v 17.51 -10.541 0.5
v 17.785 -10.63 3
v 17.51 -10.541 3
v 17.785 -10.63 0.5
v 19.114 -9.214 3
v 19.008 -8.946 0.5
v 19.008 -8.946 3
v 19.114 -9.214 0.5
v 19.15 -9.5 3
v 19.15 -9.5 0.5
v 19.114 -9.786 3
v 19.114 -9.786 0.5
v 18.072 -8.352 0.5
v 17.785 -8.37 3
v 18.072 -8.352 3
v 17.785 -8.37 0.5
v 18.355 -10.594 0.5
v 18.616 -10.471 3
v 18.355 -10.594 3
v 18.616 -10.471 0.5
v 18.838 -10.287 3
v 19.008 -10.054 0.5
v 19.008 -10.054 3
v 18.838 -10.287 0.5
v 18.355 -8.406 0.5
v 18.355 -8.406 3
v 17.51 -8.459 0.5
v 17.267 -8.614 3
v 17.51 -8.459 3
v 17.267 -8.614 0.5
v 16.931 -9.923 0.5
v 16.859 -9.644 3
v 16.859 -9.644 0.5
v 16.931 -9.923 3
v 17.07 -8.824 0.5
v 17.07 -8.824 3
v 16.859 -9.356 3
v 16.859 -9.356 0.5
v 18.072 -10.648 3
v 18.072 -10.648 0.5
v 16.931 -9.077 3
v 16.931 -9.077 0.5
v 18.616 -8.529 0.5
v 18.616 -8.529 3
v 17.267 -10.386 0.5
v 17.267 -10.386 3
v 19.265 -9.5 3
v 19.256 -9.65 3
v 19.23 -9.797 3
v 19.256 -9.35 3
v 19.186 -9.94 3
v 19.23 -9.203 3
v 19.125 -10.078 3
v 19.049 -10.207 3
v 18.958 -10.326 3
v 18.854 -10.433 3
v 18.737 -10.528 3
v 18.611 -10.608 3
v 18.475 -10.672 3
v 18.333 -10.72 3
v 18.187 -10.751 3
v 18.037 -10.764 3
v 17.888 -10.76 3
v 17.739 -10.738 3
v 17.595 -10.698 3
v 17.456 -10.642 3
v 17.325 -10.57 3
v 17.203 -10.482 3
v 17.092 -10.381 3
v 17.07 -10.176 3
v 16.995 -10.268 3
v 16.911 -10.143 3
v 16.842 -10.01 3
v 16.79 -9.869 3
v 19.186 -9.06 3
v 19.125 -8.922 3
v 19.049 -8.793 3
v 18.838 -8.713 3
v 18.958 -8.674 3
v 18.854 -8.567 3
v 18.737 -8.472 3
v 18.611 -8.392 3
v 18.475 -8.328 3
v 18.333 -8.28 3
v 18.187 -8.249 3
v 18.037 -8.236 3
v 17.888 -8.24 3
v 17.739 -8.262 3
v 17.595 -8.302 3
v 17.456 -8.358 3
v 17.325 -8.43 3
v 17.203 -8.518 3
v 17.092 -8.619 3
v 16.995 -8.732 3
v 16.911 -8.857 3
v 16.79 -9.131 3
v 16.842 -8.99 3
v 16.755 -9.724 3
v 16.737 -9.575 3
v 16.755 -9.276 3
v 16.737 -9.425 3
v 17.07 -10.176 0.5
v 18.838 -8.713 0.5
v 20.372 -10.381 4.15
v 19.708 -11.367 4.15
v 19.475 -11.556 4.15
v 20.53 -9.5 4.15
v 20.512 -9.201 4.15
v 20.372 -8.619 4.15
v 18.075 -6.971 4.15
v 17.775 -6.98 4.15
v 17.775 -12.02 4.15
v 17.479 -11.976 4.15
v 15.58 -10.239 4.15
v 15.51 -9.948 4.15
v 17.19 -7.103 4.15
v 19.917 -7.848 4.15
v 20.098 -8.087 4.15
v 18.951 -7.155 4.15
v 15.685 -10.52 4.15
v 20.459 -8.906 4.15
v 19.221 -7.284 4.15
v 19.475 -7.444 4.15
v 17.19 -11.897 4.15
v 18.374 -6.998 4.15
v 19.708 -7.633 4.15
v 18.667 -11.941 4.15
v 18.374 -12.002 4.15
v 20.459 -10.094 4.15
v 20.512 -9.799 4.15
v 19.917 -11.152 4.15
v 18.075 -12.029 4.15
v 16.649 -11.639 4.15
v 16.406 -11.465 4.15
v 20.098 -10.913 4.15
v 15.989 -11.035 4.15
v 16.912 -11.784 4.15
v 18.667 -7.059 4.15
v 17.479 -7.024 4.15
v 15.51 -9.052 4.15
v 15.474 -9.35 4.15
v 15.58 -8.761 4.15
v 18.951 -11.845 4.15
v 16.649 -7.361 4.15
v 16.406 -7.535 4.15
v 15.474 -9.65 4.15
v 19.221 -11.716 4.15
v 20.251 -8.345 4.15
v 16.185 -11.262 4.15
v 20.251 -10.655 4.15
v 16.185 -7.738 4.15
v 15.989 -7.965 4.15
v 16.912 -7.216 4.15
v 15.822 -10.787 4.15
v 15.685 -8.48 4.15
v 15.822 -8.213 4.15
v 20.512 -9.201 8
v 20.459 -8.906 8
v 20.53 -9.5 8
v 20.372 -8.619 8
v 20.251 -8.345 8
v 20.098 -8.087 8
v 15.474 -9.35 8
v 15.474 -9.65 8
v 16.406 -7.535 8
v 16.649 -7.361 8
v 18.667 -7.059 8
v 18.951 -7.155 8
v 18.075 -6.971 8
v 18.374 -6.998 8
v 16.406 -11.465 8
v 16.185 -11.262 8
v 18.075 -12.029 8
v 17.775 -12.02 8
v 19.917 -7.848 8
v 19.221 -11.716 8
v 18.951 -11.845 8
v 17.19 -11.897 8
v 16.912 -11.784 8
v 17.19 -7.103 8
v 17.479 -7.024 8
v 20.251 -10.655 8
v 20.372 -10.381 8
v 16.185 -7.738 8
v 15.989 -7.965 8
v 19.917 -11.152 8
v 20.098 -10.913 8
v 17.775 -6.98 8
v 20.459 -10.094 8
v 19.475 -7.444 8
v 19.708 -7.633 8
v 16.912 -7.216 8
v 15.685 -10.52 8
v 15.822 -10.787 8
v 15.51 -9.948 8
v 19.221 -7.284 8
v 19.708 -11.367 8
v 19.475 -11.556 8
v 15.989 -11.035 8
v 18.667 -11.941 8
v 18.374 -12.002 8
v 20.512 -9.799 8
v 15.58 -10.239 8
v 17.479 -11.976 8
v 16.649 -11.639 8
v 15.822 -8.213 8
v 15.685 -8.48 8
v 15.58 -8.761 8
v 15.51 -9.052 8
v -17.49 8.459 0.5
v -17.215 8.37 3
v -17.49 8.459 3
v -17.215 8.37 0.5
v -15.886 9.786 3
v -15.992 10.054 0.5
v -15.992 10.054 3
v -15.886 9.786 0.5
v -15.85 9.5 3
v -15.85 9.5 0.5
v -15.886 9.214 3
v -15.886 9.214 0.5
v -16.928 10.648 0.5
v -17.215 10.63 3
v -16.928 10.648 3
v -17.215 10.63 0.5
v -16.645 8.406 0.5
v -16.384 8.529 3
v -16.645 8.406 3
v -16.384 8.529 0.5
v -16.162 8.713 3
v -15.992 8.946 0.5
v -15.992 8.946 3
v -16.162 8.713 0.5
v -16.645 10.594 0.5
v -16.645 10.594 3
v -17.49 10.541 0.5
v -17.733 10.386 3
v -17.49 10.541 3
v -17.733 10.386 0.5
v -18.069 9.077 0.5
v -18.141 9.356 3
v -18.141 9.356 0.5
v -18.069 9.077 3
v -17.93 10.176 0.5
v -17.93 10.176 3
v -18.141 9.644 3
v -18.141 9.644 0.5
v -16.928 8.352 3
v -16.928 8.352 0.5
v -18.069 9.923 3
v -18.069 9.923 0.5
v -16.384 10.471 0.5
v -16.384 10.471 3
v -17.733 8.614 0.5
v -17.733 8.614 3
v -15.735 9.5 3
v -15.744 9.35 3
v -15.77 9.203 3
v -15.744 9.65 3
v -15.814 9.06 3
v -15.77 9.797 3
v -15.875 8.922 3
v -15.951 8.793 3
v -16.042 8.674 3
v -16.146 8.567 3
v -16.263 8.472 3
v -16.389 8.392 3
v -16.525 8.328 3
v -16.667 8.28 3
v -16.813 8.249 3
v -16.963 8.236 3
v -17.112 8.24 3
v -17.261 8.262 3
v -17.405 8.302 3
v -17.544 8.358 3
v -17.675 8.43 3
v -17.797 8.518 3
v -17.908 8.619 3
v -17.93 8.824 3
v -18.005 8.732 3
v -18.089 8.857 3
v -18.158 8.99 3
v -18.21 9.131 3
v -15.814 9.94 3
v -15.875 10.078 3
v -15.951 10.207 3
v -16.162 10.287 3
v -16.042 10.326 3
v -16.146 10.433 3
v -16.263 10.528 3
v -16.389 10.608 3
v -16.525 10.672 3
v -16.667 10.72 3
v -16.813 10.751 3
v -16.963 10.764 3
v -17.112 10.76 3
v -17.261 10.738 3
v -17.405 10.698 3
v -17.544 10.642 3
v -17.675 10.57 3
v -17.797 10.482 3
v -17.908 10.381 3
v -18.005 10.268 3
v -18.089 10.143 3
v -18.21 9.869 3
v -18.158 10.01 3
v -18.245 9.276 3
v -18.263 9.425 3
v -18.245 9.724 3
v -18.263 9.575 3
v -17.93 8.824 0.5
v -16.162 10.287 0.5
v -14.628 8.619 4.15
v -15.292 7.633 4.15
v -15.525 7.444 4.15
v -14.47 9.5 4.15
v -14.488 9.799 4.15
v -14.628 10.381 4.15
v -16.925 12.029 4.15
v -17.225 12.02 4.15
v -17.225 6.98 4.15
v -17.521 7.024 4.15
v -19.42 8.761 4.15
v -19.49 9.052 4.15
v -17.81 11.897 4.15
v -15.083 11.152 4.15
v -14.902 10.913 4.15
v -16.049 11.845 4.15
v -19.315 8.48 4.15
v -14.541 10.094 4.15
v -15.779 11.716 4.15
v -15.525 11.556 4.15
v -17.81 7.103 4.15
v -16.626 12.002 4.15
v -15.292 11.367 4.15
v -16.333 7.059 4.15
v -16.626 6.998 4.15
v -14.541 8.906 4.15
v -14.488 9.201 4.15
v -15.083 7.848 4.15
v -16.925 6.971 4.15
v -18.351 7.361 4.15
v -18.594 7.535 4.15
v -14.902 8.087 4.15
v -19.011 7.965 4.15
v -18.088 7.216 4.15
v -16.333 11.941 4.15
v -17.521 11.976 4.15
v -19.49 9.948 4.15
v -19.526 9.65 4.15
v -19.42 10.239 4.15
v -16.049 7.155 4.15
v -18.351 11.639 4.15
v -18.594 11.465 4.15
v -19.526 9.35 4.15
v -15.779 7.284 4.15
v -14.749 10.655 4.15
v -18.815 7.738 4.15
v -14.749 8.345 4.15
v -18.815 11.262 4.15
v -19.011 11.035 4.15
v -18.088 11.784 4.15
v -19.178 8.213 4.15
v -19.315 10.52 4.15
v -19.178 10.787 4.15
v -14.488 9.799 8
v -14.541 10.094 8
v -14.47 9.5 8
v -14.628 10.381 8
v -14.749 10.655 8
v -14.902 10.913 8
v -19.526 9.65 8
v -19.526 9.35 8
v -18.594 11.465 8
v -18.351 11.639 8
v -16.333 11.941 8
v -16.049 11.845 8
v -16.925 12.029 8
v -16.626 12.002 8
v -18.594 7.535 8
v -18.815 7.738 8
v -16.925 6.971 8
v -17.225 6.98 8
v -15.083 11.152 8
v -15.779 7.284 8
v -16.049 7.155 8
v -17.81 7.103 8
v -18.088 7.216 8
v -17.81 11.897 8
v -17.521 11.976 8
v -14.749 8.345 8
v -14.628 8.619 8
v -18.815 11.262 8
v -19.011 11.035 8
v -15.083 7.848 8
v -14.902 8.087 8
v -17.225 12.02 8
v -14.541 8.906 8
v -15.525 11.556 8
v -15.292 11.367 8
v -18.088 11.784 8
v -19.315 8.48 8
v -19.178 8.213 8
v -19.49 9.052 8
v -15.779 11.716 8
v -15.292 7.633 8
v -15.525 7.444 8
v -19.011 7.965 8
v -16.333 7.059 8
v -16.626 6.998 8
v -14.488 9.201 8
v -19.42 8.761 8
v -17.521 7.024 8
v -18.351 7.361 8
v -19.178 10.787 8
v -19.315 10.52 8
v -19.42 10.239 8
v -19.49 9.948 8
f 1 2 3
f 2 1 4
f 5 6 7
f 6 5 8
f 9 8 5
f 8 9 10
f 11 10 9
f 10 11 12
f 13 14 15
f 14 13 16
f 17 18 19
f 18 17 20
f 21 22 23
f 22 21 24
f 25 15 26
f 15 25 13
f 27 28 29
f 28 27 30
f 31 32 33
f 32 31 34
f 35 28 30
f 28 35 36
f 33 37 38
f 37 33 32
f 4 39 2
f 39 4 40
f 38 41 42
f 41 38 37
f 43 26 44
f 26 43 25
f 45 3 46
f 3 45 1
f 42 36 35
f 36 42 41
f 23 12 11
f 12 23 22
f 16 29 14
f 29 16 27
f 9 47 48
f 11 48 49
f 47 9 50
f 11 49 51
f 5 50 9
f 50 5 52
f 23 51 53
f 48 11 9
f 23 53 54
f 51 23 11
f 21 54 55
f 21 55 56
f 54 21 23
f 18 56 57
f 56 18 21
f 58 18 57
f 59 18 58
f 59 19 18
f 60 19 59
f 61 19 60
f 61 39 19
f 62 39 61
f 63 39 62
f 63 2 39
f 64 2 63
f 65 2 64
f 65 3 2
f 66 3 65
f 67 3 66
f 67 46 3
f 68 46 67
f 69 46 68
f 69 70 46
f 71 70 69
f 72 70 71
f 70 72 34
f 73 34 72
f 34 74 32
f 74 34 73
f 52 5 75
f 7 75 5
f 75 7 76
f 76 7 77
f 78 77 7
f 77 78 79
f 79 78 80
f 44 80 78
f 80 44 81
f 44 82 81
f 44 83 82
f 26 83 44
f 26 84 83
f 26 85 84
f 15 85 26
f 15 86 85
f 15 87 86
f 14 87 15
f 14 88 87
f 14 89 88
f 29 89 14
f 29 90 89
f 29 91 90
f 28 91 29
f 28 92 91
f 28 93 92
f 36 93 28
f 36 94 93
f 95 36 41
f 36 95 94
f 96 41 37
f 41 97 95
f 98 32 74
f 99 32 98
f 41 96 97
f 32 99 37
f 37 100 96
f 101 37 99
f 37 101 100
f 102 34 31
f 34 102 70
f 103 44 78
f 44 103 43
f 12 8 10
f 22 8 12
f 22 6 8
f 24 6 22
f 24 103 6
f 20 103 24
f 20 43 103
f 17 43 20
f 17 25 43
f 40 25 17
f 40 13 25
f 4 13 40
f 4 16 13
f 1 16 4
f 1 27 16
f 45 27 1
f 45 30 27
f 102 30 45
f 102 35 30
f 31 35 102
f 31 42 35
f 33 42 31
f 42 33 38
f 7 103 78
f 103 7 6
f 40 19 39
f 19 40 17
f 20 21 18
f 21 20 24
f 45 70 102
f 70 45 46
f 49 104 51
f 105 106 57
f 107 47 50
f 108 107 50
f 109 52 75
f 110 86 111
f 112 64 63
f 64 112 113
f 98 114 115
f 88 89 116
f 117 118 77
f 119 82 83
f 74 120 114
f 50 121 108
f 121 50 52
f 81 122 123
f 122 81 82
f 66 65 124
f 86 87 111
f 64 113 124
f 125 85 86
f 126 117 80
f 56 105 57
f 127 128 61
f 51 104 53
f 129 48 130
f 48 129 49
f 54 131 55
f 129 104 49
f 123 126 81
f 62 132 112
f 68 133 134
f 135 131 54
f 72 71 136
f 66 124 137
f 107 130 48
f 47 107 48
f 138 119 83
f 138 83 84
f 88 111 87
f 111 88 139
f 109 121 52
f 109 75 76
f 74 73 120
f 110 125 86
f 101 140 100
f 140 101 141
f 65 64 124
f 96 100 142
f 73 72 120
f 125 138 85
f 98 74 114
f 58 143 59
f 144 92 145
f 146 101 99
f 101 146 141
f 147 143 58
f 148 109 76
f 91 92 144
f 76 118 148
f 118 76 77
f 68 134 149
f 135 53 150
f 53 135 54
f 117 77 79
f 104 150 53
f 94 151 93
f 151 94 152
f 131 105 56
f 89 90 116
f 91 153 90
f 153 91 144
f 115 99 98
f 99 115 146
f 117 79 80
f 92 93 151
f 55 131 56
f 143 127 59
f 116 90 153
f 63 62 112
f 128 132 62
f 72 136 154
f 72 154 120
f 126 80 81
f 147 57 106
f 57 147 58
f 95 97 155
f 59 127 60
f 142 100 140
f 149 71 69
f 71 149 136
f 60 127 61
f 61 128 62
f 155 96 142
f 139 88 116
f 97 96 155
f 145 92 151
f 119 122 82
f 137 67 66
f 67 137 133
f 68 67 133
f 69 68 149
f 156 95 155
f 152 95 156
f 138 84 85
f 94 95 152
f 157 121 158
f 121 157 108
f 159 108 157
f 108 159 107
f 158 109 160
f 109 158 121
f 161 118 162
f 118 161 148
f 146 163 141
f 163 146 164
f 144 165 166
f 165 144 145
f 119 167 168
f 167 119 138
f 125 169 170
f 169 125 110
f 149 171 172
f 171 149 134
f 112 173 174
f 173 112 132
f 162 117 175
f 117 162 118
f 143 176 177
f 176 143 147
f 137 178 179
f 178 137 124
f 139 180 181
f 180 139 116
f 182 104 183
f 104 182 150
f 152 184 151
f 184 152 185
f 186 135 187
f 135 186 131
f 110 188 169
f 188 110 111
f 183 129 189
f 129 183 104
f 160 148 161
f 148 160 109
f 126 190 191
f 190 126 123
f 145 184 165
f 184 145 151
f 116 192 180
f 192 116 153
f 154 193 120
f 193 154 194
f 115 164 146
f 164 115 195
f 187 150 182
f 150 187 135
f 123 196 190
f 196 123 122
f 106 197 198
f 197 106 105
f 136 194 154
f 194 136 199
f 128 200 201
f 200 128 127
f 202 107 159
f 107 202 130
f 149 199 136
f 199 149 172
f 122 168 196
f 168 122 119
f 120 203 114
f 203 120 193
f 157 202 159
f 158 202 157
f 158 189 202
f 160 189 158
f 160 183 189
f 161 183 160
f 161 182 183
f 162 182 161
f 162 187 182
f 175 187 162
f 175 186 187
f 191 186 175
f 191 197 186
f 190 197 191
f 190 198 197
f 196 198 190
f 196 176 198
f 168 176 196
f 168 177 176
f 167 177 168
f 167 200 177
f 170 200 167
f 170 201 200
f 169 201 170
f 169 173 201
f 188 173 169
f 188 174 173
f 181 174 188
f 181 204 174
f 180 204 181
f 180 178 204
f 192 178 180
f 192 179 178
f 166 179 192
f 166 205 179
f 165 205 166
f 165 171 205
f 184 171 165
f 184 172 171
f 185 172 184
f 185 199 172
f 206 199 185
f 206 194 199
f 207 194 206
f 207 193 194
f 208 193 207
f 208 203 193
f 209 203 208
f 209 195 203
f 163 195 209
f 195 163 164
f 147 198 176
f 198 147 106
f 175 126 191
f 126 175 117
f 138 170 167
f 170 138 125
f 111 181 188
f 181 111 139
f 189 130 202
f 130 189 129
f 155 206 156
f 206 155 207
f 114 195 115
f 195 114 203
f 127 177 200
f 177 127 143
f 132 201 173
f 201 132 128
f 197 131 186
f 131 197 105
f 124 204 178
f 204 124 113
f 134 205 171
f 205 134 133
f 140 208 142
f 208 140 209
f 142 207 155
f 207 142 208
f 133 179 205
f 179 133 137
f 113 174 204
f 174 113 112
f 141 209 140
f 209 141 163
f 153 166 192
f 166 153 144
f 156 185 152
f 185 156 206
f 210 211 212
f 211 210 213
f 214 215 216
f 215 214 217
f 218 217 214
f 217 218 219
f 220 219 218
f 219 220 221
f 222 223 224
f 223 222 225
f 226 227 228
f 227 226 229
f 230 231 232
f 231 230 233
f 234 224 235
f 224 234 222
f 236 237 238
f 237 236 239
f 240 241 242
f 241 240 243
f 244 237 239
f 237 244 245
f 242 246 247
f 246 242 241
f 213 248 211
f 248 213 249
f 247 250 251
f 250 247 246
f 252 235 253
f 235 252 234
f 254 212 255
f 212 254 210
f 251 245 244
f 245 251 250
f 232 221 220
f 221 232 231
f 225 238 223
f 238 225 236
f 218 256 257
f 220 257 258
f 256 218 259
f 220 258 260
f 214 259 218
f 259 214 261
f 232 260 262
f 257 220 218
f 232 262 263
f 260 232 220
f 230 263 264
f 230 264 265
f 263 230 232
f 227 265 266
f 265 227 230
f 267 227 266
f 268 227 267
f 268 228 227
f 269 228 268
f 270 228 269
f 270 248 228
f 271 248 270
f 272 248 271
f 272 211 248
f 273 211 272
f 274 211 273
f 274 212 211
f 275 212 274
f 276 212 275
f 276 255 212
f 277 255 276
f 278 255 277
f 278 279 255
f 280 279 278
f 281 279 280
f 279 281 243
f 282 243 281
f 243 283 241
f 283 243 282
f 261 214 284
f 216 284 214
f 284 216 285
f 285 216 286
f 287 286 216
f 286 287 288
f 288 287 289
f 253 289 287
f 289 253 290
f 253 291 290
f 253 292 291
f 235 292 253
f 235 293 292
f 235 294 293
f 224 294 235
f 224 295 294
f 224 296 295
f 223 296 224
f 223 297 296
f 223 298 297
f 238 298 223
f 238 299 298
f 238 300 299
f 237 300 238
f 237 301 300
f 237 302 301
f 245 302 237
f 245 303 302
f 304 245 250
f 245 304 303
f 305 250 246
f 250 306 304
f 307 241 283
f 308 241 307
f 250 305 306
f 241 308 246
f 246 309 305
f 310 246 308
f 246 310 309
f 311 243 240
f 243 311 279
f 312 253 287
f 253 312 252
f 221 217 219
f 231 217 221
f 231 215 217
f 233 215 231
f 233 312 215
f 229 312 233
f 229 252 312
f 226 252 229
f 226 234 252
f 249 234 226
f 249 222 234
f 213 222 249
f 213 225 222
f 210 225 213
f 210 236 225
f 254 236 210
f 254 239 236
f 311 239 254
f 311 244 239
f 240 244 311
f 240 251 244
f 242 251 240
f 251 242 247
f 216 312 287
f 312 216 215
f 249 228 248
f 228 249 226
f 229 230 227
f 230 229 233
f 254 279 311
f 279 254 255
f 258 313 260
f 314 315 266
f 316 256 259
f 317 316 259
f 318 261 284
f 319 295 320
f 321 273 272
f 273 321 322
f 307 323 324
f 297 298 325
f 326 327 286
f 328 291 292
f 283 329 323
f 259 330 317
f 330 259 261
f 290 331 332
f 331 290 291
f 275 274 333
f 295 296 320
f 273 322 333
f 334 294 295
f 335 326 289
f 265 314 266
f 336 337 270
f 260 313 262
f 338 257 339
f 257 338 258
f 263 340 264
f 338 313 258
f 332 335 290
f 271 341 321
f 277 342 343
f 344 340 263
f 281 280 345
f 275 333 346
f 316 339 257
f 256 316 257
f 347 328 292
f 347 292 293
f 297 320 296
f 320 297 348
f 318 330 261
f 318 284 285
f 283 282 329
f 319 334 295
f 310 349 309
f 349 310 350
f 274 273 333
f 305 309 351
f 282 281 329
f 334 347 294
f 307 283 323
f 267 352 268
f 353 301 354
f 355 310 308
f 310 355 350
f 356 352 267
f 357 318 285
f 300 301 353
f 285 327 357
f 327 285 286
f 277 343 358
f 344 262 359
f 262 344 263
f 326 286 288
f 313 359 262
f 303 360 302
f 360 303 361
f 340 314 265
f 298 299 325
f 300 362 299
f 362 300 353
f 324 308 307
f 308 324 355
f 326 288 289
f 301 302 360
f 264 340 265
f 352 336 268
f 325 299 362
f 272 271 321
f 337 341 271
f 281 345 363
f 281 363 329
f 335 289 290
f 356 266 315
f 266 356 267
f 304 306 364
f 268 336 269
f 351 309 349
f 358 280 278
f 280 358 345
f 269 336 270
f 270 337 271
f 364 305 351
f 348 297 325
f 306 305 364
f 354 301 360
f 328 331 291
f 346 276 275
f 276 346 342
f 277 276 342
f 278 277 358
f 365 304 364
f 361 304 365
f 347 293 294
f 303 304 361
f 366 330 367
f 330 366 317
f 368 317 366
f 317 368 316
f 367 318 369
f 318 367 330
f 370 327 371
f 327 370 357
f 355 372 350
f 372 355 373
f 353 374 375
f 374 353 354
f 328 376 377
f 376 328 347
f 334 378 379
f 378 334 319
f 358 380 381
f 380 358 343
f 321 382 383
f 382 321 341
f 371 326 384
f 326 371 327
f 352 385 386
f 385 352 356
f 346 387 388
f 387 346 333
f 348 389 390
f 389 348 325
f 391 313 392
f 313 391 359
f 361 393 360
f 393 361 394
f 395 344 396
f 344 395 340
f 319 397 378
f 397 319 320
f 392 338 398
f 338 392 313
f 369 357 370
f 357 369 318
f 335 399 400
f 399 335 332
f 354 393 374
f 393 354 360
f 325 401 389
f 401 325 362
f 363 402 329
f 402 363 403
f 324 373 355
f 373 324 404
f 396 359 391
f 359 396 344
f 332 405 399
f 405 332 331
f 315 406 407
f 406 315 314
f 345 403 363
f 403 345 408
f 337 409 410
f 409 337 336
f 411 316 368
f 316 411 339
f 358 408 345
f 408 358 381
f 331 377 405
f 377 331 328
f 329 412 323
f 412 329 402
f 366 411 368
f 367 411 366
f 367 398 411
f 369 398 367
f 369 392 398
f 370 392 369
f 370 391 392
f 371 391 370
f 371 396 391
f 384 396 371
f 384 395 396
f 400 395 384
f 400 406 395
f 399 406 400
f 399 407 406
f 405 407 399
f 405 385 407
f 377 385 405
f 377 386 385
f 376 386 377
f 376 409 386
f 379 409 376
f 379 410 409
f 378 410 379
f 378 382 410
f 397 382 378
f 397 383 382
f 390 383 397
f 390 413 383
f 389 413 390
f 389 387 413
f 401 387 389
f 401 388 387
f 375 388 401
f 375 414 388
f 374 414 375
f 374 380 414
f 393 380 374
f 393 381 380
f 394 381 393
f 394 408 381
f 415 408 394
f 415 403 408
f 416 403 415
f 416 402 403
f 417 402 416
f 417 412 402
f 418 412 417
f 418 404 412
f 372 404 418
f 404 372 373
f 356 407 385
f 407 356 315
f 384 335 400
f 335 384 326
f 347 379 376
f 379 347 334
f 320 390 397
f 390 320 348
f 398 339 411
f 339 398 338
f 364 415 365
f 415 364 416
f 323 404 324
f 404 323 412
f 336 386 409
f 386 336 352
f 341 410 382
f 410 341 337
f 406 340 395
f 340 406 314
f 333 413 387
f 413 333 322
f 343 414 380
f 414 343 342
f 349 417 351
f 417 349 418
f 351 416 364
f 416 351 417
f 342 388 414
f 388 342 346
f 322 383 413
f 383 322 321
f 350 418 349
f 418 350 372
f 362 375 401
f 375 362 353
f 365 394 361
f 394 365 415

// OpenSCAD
// file: usedims.scad
acc =  "print";  // "show"

$fa = acc=="print" ? 2 : 7; //1;
$fs = acc=="print" ? .3 : 1; //.2; //.02


mountT=22;
rcorner=2;

//BODY:
Rtop=11; //mountT;
Hframe=193;
Wbottom=100; //95; //  124;
alpha = 4.5; //4.5; // 7.5
Wtop = edgex(Hframe)*2; // Wbottom - 2*Hframe*tan(alpha); //Whead-2; // + 2*Rtop*tan(alpha);
//alpha = atan(((Wbottom-Wtop)/2)/(Hframe + Rtop));
Rbottom = rcorner;
Tframe=55;
Hthick = 30;

//HEAD:
//Whead=59; 
Hhead=115;
Lhead=42;
Hneck = .4;
Rhead=rcorner;
headaddW=0;
Zheadbottom=Hframe+Rtop+Hneck+Rhead; 
Wheadbottom=edgex(Zheadbottom)*2 + headaddW; 
Wheadtop=edgex(Zheadbottom+Hhead)*2 + headaddW; 
wallT=1.60;
headtheta=6.9;
headBottomT = Lhead - mountT;
headServoNteeth=15;
mountD=6;
dwall = 4;
headmountpolepos1=[for (z=[dwall]) [edgex(z, Wheadbottom) - dwall,z]];
sf = 6;
headmountpolepos2= concat(headmountpolepos1, [for (p=headmountpolepos1) [-p[0], p[1]]]); // [[Whead/2 - dwall, Hhead/2 - sf], [-Whead/2 + dwall, Hhead/2 + sf]]);
headmountpolepos= concat(headmountpolepos2, [for (z=[[-1, Hhead/2-4], [1, Hhead/2-4]]) [z[0]*edgex(z[1], Wheadbottom)-z[0]*dwall, z[1]]]); // [[Whead/2 - dwall, Hhead/2 - sf], [-Whead/2 + dwall, Hhead/2 + sf]]);



//
function edgex(h, W=Wbottom) = W/2 - h*tan(alpha);

framemountpolepos_l=[for (h=[-Rbottom+dwall,Hframe/2-12, Hframe-40, Hframe]) [edgex(h) - dwall, h]];
framemountpolepos_r=[for (p=framemountpolepos_l) [-p[0], p[1]]];
framemountpolepos_b=[for (i=[-1,1]) [i*18, -Rbottom + dwall]];
framemountpolepos = concat(framemountpolepos_l, framemountpolepos_r, framemountpolepos_b);

echo(framemountpolepos);

TIGHTSP = .05;
MEDIUMSP = .1;
//
// BOLTS:
BOLT5TIGHT=4.8;
BOLT5LOOSE=5.05;
BOLT3TIGHT=2.8;
BOLT3LOOSE=3.05;
BOLT25TIGHT = 2.30; // 2.35
BOLT25LOOSE = 2.60;
BOLT15TIGHT = 1.30; // 2.35
BOLT15LOOSE = 1.60;

AXLEBEARINGDIMS = [10, 15, 4];
AXLECOVERT = 1.2;
SERVOHORNSP = .96;
// file: utils.scad
include <dims.scad>;
include <usedims.scad>;

function pitchD(ntooth, modul=GEARMODUL) = ntooth*modul;
function getNTeeth(servoNtooth, targetTurnAngle, servoTrunAngle) = ceil(servoNtooth/targetTurnAngle*servoTrunAngle);
function gearD(ntooth, modul=GEARMODUL) = ntooth*modul + 2*modul;
module bolt(h, d, sink, baseL=5, key="csunk"){
   	
	// Expand the bolt sink hole by this amount: 
	sinkExpFac = 1.1;
	
	// Gray bolts
    	color("Gray")
    	translate([0,0,sink])
    	union(){
		// bolt thread
		translate([0,0,d/2]) cylinder(h=h, r=d/2);
		// bolt base
		if (key=="csunk"){cylinder(h=d/2, r1=d*sinkExpFac, r2=d/2*sinkExpFac);}
		else if (key=="flat"){cylinder(h=d/2 - .2, r=d*sinkExpFac);}
		
		translate([0,0,-baseL - sink]) cylinder(h=baseL + sink, r=d*sinkExpFac);
    	}
}


module thread(h, d, phi=0, threadH=THREADH, pitch=THREADPITCH, aligner="show", dtip1=0, dtip2=0, handness="right"){

	handmltp = handness == "right" ? -1 : 1;
	phi = -phi*handmltp;
	twistphi = handmltp*h/pitch*360;
	dtip1 = dtip1==0 ? d*4/5 : dtip1; // top
	dtip2 = dtip2==0 ? d*4/5 : dtip2; // bottom

	module thread_base(){
		difference(){
		rotate([0,0,twistphi/2])
		linear_extrude(height=h, twist=twistphi, center=true, slices=round(h/.15)) 
		translate([threadH/2,0]) 
		circle(d/2-threadH/2);
		if (htip(dtip1)>0){translate([0,0,h/2]) tipcutter(dtip1);}
		if (htip(dtip2)>0){translate([0,0,-h/2]) mirror([0,0,1]) tipcutter(dtip2);}
		}

	}
	
	tiptheta = 60;
	function htip(dtip) = (d - dtip)/2*tan(tiptheta);

	module tipcutter(dtip){
		htip_ = htip(dtip);
		translate([0,0,-htip_])
		difference(){
			cylinder(h=2*htip_, d=2*d);
			cylinder(h=htip_, d1=d, d2=dtip);
		}
	}
	
	rotate([0,0,phi]){
		if (aligner=="dontshow"){
			thread_base();
		}
		else if (aligner=="show"){	
			thread_base();
			translate([50,0,0])cube([100, 1, 1], center=true);
		}
		else if (aligner=="onlyaligner"){
			translate([50,0,0])cube([100, 1, 1], center=true);
		}
	
	}

}
module closebolts(key, positions, L, forceboltD=-1){
 
 boltD_ = key=="boltsup" ? BOLT3LOOSE :
         key == "boltsbot" ? BOLT3TIGHT : 0;
 
 boltD = forceboltD > 0 ? forceboltD : boltD_;

 key_ = key=="boltsup" || key=="boltsbot" ? "bolt" : key;
 for (pos=positions){
   x = pos[0];
   z = pos[1];
   translate([x,0,z]) 
   rotate([90,0,0])
   closebar(L=L, boltD=boltD, key=key_);
 }
}

module closebar(L, boltD=BOLT3LOOSE, key="mockup"){
  Ltop = L/2;
  Lbot = L/2 - .5;
  D = CLOSEBARD; 
  if (key=="barup"){
    cylinder(d=D, h = Ltop);
  }
  else if (key=="barbot"){
    translate([0,0,-L/2])
    cylinder(d=D, h = Lbot);
  }
  else if (key=="bolt"){
    mirror([0,0,1])
    translate([0,0,-L/2])
    bolt(L-3, d=boltD,sink=.5);
    mirror([0,0,1]) cylinder(h=.5, r=boltD);
  }
  
  //bolt(L-3, d=boltD,sink=.5);
}

module rounded_tilted_cylinder(L, R, r, alpha){
  
  assert(R>=r); 
  module end(){
    translate([0,0,L/2])
    rotate([0,alpha, 0])  
    translate([0,0,-r*cos(alpha)])
    scale([1/cos(alpha), 1, 1])
  
    rotate_extrude()
    union(){
      translate([0,-r]) square([R-r, 2*r]);  
      translate([R-r, 0]) 
      intersection(){
        circle(r);
        translate([0,-r]) square([r, 2*r]);
      }
      }

    }

    hull(){
    end();
    mirror([0,0,1]) end();
    }
}

module selector(ycut, side=-1){

  shifty = side==-1 ? 5000 : -5000; 
  
  difference(){
    children();
    translate([0,shifty + ycut, 0]) cube(10000, center=true);
  }
  
  
}

module mount_poles_bolts(positions, D=mountD, negy=-500, holeD=0){
  
  for (p=positions){
    translate([p[0], negy, p[1]])
    rotate([-90,0,0]) 
    if (holeD>0){
      difference(){
        bolt(1000, d=D, sink=.2);
        cylinder(h=2000, d=holeD);
      }
    }
    else {bolt(1000, d=D, sink=.2);}
  }
}



module roundedcube(size = [1, 1, 1], center = false, radius = 0.5, apply_to = "all") {
	// If single value, convert to [x, y, z] vector
	size = (size[0] == undef) ? [size, size, size] : size;

	translate_min = radius;
	translate_xmax = size[0] - radius;
	translate_ymax = size[1] - radius;
	translate_zmax = size[2] - radius;

	diameter = radius * 2;

	module build_point(type = "sphere", rotate = [0, 0, 0]) {
		if (type == "sphere") {
			sphere(r = radius);
		} else if (type == "cylinder") {
			rotate(a = rotate)
			cylinder(h = diameter, r = radius, center = true);
		}
	}

	obj_translate = (center == false) ?
		[0, 0, 0] : [
			-(size[0] / 2),
			-(size[1] / 2),
			-(size[2] / 2)
		];

	translate(v = obj_translate) {
		hull() {
			for (translate_x = [translate_min, translate_xmax]) {
				x_at = (translate_x == translate_min) ? "min" : "max";
				for (translate_y = [translate_min, translate_ymax]) {
					y_at = (translate_y == translate_min) ? "min" : "max";
					for (translate_z = [translate_min, translate_zmax]) {
						z_at = (translate_z == translate_min) ? "min" : "max";

						translate(v = [translate_x, translate_y, translate_z])
						if (
							(apply_to == "all") ||
							(apply_to == "xmin" && x_at == "min") || (apply_to == "xmax" && x_at == "max") ||
							(apply_to == "ymin" && y_at == "min") || (apply_to == "ymax" && y_at == "max") ||
							(apply_to == "zmin" && z_at == "min") || (apply_to == "zmax" && z_at == "max")
						) {
							build_point("sphere");
						} else {
							rotate = 
								(apply_to == "xmin" || apply_to == "xmax" || apply_to == "x") ? [0, 90, 0] : (
								(apply_to == "ymin" || apply_to == "ymax" || apply_to == "y") ? [90, 90, 0] :
								[0, 0, 0]
							);
							build_point("cylinder", rotate);
						}
					}
				}
			}
		}
	}
}


function slice(a, i1=0, i2=-1) =i2==-1 ? slice(a, i1, len(a)) : [for (i = [ 0 :1:len(a)-1]) if (i>=i1 && i<(i2+1)) a[i]];


function sum_slice(a, i1=0, i2=-1) = sum(slice(a, i1, i2));

function sum(a, i=0, r=0) = i < len(a) ? sum(a, i+1, r+a[i]) : r;

function cumsum(a) = [for (i=[0:1:len(a)-1]) sum_slice(a, 0, i)];


module rounded_cutter(L, W, T, r){
  assert(min(W,T)>2*r);

  linear_extrude(height=L, center=true)
  offset(r)
  square([W-2*r, T-2*r],center=true);

}
// file: dims.scad
Llow = 96;
Lup_low = 119;
Lup_top = 65;
Wbot=80; //72;
servoaxleL = Wbot/5*2;
hornW = .85*servoaxleL;
Dbot=30;
Lservo = 57;
wallT = 2;
rbot=wallT/2;
rcablebundle=6;
xcablebundle = Wbot/2 - rcablebundle - rbot - 5.5;
xconnection=-3; //-6.1;
mouthR = 11/2+wallT; //Dbot/4;
dedge = Wbot/2 - rbot - 3.5; //BOLT3LOOSE;

BEAMMAXANGLE=120;
mouthcablex = 13;
CLOSEBARD=3+.42*8;
CHINDIST=.2;
SERVOTURNANGLE = 120;

beamServoNtooth= 20;
mg215dims = [23, 26.5, 12, 6];	
LHORNTHREAD = 12;
hornarmL=Dbot/2 - 5.3;
xleg=10;

Wlegs = Wbot + 2;
Tlegs = Dbot/3*2;
Hlegs = 18;

// BOLTS:
BOLT5TIGHT=4.8;
BOLT5LOOSE=5.05;
BOLT3TIGHT=2.8;
BOLT3LOOSE=3.05;
BOLT25TIGHT = 2.30; // 2.35
BOLT25LOOSE = 2.60;
BOLT15TIGHT = 1.30; // 2.35
BOLT15LOOSE = 1.60;

// GEARS:
//GEART = 12; //6
GEARMODUL = 1.0; //1.0;
HELIXANGLE=20; // 30
PRESSUREANGLE=10; //25;

SERVOGEARNTOOTH = 15; // 15
SERVOHORNT = 7.0; //6
SERVOHORNBEARINGT = 4;

// Bore, Diam, Thickness
SERVOBEARINGDIMS = [5, 11, 4];
AXLEBEARINGDIMS = [10, 15, 4];
WHEELBEARINGDIMS = [20, 27, 4];

AXLEHORNDIN = AXLEBEARINGDIMS[0]/sqrt(2);

SERVOHORNSP = .96;
TIGHTSP = .05;
RADSP = .15; // .25
AXLECOVERT = 1.2;

THREADH=.6;
THREADPITCH = 2;



GEARCOLOR="Ivory"; //WhiteSmoke"; //SlateGray";
BEARINGCOLOR="Gray";
$fn = 0; //50000;


THREADSPACEPHI = 30; // Positive means you have to twist further to tighten by phi than theory.
SHOWALIGNERS = false; //true; 
CUTALIGNERS = false; // Cut wedges to gears to check match.
// main file
include <dims.scad>;
use <utils.scad>;

servoctrldims = [30,20,10];
servoctrlmntpos = [[0,1], [20, 10]];

module generalel(dims, mountpos, boltD=BOLT3TIGHT, H=2, key="mockup", boltH=0, poleD=0){
	
	poleD = poleD==0 ? boltD*2 : poleD;
	module poles(){
		for (p=mountpos){
			translate(p) cylinder(h=H, d=poleD);
		}
	}

	module bolts(){
		boltH = boltH == 0 ? H - .5 : boltH;
		
		color("Gray")	
		for (p=mountpos){
			translate(p) translate([0,0,H]) mirror([0,0, 1]) bolt(boltH, boltD, -boltD/2);
		}
	}
	
	translate([-dims[0]/2, -dims[1]/2, 0])
	if (key=="mockup"){
		echo("mckup");
		poles();
		color("Navy")
		translate([0,0,H]) cube(dims);
	}
	else if (key=="bolts"){bolts();}
	else if (key=="poles"){poles();}
	else if (key=="board"){
    		color("Navy")
		translate([0,0,H]) cube(dims);
	}
}


module micarray(H=5, key="mockup", boltH=0){
	
	dims = [65, 65, 2];
	mountpos = [[3.5, 8], [61.5, 8], [3.5, 57], [61.5, 57]];
	boltD = BOLT25TIGHT;
	boltH= boltH==0 ? H + 1: boltH; //  + 1.5;
	H = H;

	generalel(dims, mountpos, boltD=boltD, H=H, key=key, boltH=boltH);
	
	module ledring(){
		ringh = boltH;
		translate([0,0,H-ringh])
		difference(){
			cylinder(h=ringh, r=62/2);
			cylinder(h=ringh, r=62/2-5);
		}
	}
	
	module micring(){
		mich = H + 15;
		
		for (phi=[90:90:360]){
			rotate([0,0,phi])
			translate([dims[0]/2 - 2 - 1., dims[1]/2 - 3, -mich/2 + H]) 
			cube([4+1, 3+1, mich], center=true);
		}
	}
	
	if (key=="micsleds"){
		ledring();
		micring();
	}
	
}
module huzzah32(H=5, key="mockup", boltH=0, boltD=BOLT25TIGHT){
	dims = [2*25.4, 0.9*25.4, 2];
        mounty = 0.15*25.4/2;
	mountpos = [[2.5, mounty], [dims[0] - 2.5, mounty], [2.5, dims[1] - 2.5], [dims[0] - 2.5, dims[1] - mounty]];
	//boltH= boltH==0 ? H : boltH; //  + 1.5;
	color("DarkSlateGray")	
	if (key!="usb") generalel(dims, mountpos, boltD=boltD, H=H, key=key, boltH=boltH);
	else {
		usbr = 4;
		w = 11;

		hull() for (y=[-1,1]) translate([-dims[0]/2, (w/2-usbr)*y, H + 2.5]) rotate([00,90,0]) cylinder(h=15, r=usbr, center=true);
	}
	

}
module imu(H=5, key="mockup", boltH=0, boltD=BOLT25TIGHT){
	dims = [25.4, 0.9*25.4, 2];
	mountpos = [[2.54, 2.54], [dims[0] - 2.54, 2.54], [2.5, dims[1] - 2.54], [dims[0] - 2.54, dims[1] - 2.54]];

	color("DarkSlateGray")	
	if (key!="usb") generalel(dims, mountpos, boltD=boltD, H=H, key=key, boltH=boltH);
	else {
		usbr = 4;
		w = 11;

		hull() for (y=[-1,1]) translate([-dims[0]/2, (w/2-usbr)*y, H + 2]) rotate([00,90,0]) cylinder(h=15, r=usbr, center=true);
	}
	

}

module buckconverter(H=5, key="mockup", boltH=0, boltD=BOLT25TIGHT){
	dims = [43, 21, 2];
	mountpos = [[36.5, 2.5], [6.5, 21-2.5]];
	
	//boltH = boltH==0 ? H: boltH; //  + 1.5;
	
	color("DarkSlateGray")	
	generalel(dims, mountpos, boltD=boltD, H=H, key=key, boltH=boltH);

}
module buckconverter_XL4015(H=5, key="mockup", boltH=0, boltD=BOLT25TIGHT){
	dims = [54, 24, 2];
	mountpos = [[45, 2.5], [10, 24-2.5]];
	
	//boltH = boltH==0 ? H: boltH; //  + 1.5;
	
	color("DarkSlateGray")	
	generalel(dims, mountpos, boltD=boltD, H=H, key=key, boltH=boltH);
	//translate([54/2,0,H]) cube(2, center=true);
}

module servoctrl(H=5, key="mockup", boltH=0, boltD=BOLT25TIGHT){
	dims = [63, 25.5, 2];
	mountpos = [[3.5, 3], [59.5, 3], [3.5, 22], [59.5, 22]];
	//boltH= boltH==0 ? H : boltH; //  + 1.5;
	color("DarkSlateGray")	
	generalel(dims, mountpos, boltD=boltD, H=H, key=key, boltH=boltH);

}

module nanoble(H=5, key="mockup", boltH=0, boltD=BOLT15TIGHT){
        dwall=1.5;
	dims = [43.4, 18, 2];
	mountpos = [[dwall, dwall], [dims[0]-dwall, dwall], [dwall, dims[1]-dwall], [dims[0]-dwall, dims[1]-dwall]];
	//boltH= boltH==0 ? H : boltH; //  + 1.5;
	color("DarkSlateGray")	
	generalel(dims, mountpos, boltD=boltD, H=H, key=key, boltH=boltH, poleD=4);
        if (key=="bolts"){
          translate([dims[0]/2,0,H+4])
          rotate([0,90,0])
          rounded_cutter(20, 8, 12, 1);
        }

}


module protoboard(H=5, key="mockup", boltH=0, boltD=BOLT25TIGHT){

	dims = [80, 20.5, 2];
	mountpos = [[2.5, 2.5], [77.5, 2.5], [2.5, 18], [77.5, 18]];
	
	//boltH = boltH==0 ? H: boltH; //  + 1.5;
	
	color("DarkSlateGray")	
	generalel(dims, mountpos, boltD=boltD, H=H, key=key, boltH=boltH);
}

module protoboard2(H=5, key="mockup", boltH=0, boltD=BOLT25TIGHT){

	dwall=2.5;
	dims = [71, 30.5, 2];
	mountpos = [[dwall, dwall], [dims[0]-dwall, dwall], [dwall, dims[1]-dwall], [dims[0]-dwall, dims[1]-dwall]];
	
	//boltH = boltH==0 ? H: boltH; //  + 1.5;
	
	color("DarkSlateGray")	
	generalel(dims, mountpos, boltD=boltD, H=H, key=key, boltH=boltH);
}



module camera(key, H=30, boltD=BOLT25TIGHT){
	holeD = 30;
	cameraW = 38;
	cameraR = 32/2;
	mountH = H;
	mountR = 3.0;

	mountHoles= [for (i=[-1, 1]) for (j=[-1,1]) [i*holeD/2, j*holeD/2, 0]];
	
	module mount(){
		for (p=mountHoles){
			translate(p) cylinder(h=mountH, r=mountR);
		}
	}

	module camandbolts(){

		// Camera	
		color("Black") cylinder(h=35, r=cameraR);
		for (p=mountHoles){
			translate(p) bolt(21, boltD, -boltD/2);
		}
	}
	
	module ring(){
		wt=1.6;
		D = holeD*sqrt(2) + mountR;
		ringH = H - 2; //H-2;
		module solid(wt){
			cylinder(d=holeD*sqrt(2) - mountR*2 + 2*wt, h=ringH);
			/*hull(){
			for (p=mountHoles){
				translate([p[0], p[1] , 0]) cylinder(h=mountH - ringH, r=wt);
				}
			}*/
		}

		T = mountR  ;
		translate([0,0,2])
		difference(){
			solid(wt);
			translate([0,0,-.1]) scale([1,1,2])solid(0);
			//cube([12, 45, 25], center=true);
			translate([0,20,0]) rotate([90,0,0]) rounded_cutter(30, 12, 26, 2);
		}

        }

	if (key=="cut"){camandbolts();}
	if (key=="poles"){
		difference(){
		mount();
		camandbolts();}

	}
	if (key=="ring"){ring();}
}


module rpizero(key, H=5, T=2, pijuice=false, boltH=0, boltD=BOLT3TIGHT){
	
        if (pijuice) assert(H>7);

	dims = [65,30,T];
	mount_holes = [[3.5, 3.5], [dims[0]-3.5, 3.5],
		       [3.5, dims[1]-3.5], [dims[0]-3.5, dims[1]-3.5]];
	module board(){
		translate([0,0,dims[2]/2]) cube(dims, center=true);
	}
	
	module mountpoles(H=H, key="poles"){
		translate([-dims[0]/2, -dims[1]/2, 0])
		for (p=mount_holes){
			translate(p)
			if (key=="poles"){
				translate([0,0, -H]) {
				cylinder(h=H, r=BOLT3LOOSE);
				//cylinder(h=H+dims[2]+1, r1=2.75/2, r2=2.6/2);
}
			}
			else if (key=="bolts"){
				boltH = boltH==0 ? H-.2 : boltH;
				mirror([0,0,1]) bolt(boltH, boltD, -boltD/2);
			}
		}
	}
	
	module usbcharge(){
		dy = 2.;
		translate([dims[0]/2, -dims[1]/2+11, -1.5])
		hull(){
		for (j=[-1,1]) translate([0, j*dy, 0]) rotate([0,90,0]) cylinder(h=20, r=3.5);
		}
	}
	module sdcard(){
		dy = 2.;
 		wsd = 15;
		tsd=3; 
		zsd=7.0; //TODO: measure this from bottom to sd center!
		translate([dims[0]/2, dims[1]/2-13, zsd])
		rotate([0,90,0]) rounded_cutter(20, tsd, wsd, tsd/4);
	}
	

	module pwrswitch(){
		translate([dims[0]/2 - 20.5, -dims[1]/2 - 2, -H-5]) cube([5, 2, 30]);
	}
	
	module pins(){
		//TODO: check dims!
		dx = 2.54;
		h = 2.5;
		X = -dims[0]/2 + 7;
		Y = dims[1]/2 - 1.9*dx;
		for (i=[0:1:20]) for (j=[0,1]) translate([i*dx + X, j*dx+ Y,+2 + 7.5]) cylinder(h=h, d=2.5); 
	}
	
	translate([0,0,H])
	if (key=="boardpoles"){
		board();
		mountpoles();
	}
	else if (key=="poles"){
		mountpoles();
	}
	else if (key=="bolts"){
		mountpoles(key="bolts");
	}
	else if (key=="cut"){
		translate([0,0,7.5 + 2])  
		rotate([180,0,0]){
		  usbcharge();
		  pwrswitch();
		  sdcard();
		  pins();
		}
		mountpoles(key="bolts");
	}
}

module batt18650(center=true){
  cylinder(h=65, d=18, center=center);
}
module batt1500(){
  L = 52;
  W = 34;
  H = 8;
  color("Blue")
  translate([0,0,H/2])
  cube([L, W, H], center=true);
}

module battery(key="3S"){
	if (key=="3S"){cube([30,27, 55], center=true);}
	else if (key=="2S"){cube([35,18, 67], center=true);}
}
module switches(key){
    T = 2;
    wT = 1;
    swichframeW = 8.2 + 2*TIGHTSP;
    swichframeH = 7.3 + 2*TIGHTSP;
    swichframeT = 5.4;
    threadL=8;
    threadD=5;

    module swich_(){
        
      translate([-3,0,0]){
        rotate([0,90,0]) cylinder(h=threadL, d=threadD);
        translate(-[swichframeH, swichframeW/2, swichframeT/2]) {
          cube([swichframeH, swichframeW, swichframeT]);
          translate([-swichframeH,.5,0]) cube([swichframeH, swichframeW-1, swichframeT]);
        }
      }
    }
    module cut(){
    	armT = 3;
    	alpha = 40;
    	translate([+wT/2, 0, -armT/2])
    	rotate([0,0,-alpha/2])
    	rotate_extrude(angle=alpha) square([20, armT]);
    } 

    cut();
    swich_();
}

module switchmount(){
  wallT = 3;
  H = 12;
  W = 8;
  R = 5/2;

  module base(){
    difference(){
      translate([0,0,wallT/2]) cube([H, W, wallT], center=true);
      cylinder(h=3*wallT, r=R, center=true);
    }
  }

  module sidelevercut(){
    rotate([90,0,0])
    translate([0, threadL, 0])
    rotate([0,0,90-angle/2])
    rotate_extrude(angle=angle)
    translate([Llever, 0]) square([leverD, 20], center=true);
  }

  module straightlevercut(){

    translate([0, 0, threadL])
    rotate([90,0,0])
    rotate([0,0,90-angle/2])
    rotate_extrude(angle=angle)
    translate([10, 0]) square([20, leverD], center=true);
  }

  Llever = 10;
  threadL=8;
  leverD=2;
  angle=45;

  base();
  sidelevercut();
  straightlevercut();
}

module slideswitch(key, baseT=3, boltT=0, boltL=10, boltside="top"){
  
  // body extreme dims
  W = 36;
  H = 18.7;
  T = 10.8;

  // Sliden hantag dims:
  sW = 13;
  sH = 7.8;
  sT = 6;

  // Bulk dims:
  bW = 24.2;
  bH = H - 7.8;
  bT = T;


  // hole distance
  holeDist = 30;
  boltD = BOLT3LOOSE;
  boltT = boltT==0 ? baseT : boltT;

  module cut_(addsl){
    bolts_();
    bulk_();
    slider_(addsl);
  }
  module bulk_(){
    translate([0,0,-bH/2])
    cube([bW, bT, bH], center=true);
  }

  module slider_(addSh){
    translate([0,0,(sH+ addSh)/2])
    cube([sW, sT, sH+addSh], center=true);
  }
  
  module base_(){
    translate([0,0,baseT/2]) 
    hull(){
      cube([W, T, baseT], center=true);
      translate([0,0,baseT/2]) cube([W + baseT*2*tan(45), T + baseT*tan(45)*2, .0001], center=true);
    }

  }
  module bolts_(){
    module twobolts(){
      for (i=[-1,1]) translate([i*holeDist/2, 0, boltT]) mirror([0,0,1]) bolt(boltL, boltD, 0);
    }

    if (boltside=="top") twobolts();
    else mirror([0,0,1]) twobolts();
  }
  
  translate([0,0,-baseT]){ 
    if (key=="switch") bulk_();
    if (key=="base") base_();
    if (key=="cut") cut_(6);
    if (key=="mockup") cut_(0);
    if (key=="bolts") bolts_();
  }
   
}

//slideswitch("mockup", boltside="top");
//slideswitch("base", baseT=4);
//rpizero("cut", H = 8, T=10);
//switches();
//switchmount();
//nanoble(3, key="poles");
//protoboard2(3, key="poles");
//translate([0,20,0]) buckconverter(3, key="poles");
//$fa = 1;
//$fs = .2;
buckconverter_XL4015(3, key="bolts");
